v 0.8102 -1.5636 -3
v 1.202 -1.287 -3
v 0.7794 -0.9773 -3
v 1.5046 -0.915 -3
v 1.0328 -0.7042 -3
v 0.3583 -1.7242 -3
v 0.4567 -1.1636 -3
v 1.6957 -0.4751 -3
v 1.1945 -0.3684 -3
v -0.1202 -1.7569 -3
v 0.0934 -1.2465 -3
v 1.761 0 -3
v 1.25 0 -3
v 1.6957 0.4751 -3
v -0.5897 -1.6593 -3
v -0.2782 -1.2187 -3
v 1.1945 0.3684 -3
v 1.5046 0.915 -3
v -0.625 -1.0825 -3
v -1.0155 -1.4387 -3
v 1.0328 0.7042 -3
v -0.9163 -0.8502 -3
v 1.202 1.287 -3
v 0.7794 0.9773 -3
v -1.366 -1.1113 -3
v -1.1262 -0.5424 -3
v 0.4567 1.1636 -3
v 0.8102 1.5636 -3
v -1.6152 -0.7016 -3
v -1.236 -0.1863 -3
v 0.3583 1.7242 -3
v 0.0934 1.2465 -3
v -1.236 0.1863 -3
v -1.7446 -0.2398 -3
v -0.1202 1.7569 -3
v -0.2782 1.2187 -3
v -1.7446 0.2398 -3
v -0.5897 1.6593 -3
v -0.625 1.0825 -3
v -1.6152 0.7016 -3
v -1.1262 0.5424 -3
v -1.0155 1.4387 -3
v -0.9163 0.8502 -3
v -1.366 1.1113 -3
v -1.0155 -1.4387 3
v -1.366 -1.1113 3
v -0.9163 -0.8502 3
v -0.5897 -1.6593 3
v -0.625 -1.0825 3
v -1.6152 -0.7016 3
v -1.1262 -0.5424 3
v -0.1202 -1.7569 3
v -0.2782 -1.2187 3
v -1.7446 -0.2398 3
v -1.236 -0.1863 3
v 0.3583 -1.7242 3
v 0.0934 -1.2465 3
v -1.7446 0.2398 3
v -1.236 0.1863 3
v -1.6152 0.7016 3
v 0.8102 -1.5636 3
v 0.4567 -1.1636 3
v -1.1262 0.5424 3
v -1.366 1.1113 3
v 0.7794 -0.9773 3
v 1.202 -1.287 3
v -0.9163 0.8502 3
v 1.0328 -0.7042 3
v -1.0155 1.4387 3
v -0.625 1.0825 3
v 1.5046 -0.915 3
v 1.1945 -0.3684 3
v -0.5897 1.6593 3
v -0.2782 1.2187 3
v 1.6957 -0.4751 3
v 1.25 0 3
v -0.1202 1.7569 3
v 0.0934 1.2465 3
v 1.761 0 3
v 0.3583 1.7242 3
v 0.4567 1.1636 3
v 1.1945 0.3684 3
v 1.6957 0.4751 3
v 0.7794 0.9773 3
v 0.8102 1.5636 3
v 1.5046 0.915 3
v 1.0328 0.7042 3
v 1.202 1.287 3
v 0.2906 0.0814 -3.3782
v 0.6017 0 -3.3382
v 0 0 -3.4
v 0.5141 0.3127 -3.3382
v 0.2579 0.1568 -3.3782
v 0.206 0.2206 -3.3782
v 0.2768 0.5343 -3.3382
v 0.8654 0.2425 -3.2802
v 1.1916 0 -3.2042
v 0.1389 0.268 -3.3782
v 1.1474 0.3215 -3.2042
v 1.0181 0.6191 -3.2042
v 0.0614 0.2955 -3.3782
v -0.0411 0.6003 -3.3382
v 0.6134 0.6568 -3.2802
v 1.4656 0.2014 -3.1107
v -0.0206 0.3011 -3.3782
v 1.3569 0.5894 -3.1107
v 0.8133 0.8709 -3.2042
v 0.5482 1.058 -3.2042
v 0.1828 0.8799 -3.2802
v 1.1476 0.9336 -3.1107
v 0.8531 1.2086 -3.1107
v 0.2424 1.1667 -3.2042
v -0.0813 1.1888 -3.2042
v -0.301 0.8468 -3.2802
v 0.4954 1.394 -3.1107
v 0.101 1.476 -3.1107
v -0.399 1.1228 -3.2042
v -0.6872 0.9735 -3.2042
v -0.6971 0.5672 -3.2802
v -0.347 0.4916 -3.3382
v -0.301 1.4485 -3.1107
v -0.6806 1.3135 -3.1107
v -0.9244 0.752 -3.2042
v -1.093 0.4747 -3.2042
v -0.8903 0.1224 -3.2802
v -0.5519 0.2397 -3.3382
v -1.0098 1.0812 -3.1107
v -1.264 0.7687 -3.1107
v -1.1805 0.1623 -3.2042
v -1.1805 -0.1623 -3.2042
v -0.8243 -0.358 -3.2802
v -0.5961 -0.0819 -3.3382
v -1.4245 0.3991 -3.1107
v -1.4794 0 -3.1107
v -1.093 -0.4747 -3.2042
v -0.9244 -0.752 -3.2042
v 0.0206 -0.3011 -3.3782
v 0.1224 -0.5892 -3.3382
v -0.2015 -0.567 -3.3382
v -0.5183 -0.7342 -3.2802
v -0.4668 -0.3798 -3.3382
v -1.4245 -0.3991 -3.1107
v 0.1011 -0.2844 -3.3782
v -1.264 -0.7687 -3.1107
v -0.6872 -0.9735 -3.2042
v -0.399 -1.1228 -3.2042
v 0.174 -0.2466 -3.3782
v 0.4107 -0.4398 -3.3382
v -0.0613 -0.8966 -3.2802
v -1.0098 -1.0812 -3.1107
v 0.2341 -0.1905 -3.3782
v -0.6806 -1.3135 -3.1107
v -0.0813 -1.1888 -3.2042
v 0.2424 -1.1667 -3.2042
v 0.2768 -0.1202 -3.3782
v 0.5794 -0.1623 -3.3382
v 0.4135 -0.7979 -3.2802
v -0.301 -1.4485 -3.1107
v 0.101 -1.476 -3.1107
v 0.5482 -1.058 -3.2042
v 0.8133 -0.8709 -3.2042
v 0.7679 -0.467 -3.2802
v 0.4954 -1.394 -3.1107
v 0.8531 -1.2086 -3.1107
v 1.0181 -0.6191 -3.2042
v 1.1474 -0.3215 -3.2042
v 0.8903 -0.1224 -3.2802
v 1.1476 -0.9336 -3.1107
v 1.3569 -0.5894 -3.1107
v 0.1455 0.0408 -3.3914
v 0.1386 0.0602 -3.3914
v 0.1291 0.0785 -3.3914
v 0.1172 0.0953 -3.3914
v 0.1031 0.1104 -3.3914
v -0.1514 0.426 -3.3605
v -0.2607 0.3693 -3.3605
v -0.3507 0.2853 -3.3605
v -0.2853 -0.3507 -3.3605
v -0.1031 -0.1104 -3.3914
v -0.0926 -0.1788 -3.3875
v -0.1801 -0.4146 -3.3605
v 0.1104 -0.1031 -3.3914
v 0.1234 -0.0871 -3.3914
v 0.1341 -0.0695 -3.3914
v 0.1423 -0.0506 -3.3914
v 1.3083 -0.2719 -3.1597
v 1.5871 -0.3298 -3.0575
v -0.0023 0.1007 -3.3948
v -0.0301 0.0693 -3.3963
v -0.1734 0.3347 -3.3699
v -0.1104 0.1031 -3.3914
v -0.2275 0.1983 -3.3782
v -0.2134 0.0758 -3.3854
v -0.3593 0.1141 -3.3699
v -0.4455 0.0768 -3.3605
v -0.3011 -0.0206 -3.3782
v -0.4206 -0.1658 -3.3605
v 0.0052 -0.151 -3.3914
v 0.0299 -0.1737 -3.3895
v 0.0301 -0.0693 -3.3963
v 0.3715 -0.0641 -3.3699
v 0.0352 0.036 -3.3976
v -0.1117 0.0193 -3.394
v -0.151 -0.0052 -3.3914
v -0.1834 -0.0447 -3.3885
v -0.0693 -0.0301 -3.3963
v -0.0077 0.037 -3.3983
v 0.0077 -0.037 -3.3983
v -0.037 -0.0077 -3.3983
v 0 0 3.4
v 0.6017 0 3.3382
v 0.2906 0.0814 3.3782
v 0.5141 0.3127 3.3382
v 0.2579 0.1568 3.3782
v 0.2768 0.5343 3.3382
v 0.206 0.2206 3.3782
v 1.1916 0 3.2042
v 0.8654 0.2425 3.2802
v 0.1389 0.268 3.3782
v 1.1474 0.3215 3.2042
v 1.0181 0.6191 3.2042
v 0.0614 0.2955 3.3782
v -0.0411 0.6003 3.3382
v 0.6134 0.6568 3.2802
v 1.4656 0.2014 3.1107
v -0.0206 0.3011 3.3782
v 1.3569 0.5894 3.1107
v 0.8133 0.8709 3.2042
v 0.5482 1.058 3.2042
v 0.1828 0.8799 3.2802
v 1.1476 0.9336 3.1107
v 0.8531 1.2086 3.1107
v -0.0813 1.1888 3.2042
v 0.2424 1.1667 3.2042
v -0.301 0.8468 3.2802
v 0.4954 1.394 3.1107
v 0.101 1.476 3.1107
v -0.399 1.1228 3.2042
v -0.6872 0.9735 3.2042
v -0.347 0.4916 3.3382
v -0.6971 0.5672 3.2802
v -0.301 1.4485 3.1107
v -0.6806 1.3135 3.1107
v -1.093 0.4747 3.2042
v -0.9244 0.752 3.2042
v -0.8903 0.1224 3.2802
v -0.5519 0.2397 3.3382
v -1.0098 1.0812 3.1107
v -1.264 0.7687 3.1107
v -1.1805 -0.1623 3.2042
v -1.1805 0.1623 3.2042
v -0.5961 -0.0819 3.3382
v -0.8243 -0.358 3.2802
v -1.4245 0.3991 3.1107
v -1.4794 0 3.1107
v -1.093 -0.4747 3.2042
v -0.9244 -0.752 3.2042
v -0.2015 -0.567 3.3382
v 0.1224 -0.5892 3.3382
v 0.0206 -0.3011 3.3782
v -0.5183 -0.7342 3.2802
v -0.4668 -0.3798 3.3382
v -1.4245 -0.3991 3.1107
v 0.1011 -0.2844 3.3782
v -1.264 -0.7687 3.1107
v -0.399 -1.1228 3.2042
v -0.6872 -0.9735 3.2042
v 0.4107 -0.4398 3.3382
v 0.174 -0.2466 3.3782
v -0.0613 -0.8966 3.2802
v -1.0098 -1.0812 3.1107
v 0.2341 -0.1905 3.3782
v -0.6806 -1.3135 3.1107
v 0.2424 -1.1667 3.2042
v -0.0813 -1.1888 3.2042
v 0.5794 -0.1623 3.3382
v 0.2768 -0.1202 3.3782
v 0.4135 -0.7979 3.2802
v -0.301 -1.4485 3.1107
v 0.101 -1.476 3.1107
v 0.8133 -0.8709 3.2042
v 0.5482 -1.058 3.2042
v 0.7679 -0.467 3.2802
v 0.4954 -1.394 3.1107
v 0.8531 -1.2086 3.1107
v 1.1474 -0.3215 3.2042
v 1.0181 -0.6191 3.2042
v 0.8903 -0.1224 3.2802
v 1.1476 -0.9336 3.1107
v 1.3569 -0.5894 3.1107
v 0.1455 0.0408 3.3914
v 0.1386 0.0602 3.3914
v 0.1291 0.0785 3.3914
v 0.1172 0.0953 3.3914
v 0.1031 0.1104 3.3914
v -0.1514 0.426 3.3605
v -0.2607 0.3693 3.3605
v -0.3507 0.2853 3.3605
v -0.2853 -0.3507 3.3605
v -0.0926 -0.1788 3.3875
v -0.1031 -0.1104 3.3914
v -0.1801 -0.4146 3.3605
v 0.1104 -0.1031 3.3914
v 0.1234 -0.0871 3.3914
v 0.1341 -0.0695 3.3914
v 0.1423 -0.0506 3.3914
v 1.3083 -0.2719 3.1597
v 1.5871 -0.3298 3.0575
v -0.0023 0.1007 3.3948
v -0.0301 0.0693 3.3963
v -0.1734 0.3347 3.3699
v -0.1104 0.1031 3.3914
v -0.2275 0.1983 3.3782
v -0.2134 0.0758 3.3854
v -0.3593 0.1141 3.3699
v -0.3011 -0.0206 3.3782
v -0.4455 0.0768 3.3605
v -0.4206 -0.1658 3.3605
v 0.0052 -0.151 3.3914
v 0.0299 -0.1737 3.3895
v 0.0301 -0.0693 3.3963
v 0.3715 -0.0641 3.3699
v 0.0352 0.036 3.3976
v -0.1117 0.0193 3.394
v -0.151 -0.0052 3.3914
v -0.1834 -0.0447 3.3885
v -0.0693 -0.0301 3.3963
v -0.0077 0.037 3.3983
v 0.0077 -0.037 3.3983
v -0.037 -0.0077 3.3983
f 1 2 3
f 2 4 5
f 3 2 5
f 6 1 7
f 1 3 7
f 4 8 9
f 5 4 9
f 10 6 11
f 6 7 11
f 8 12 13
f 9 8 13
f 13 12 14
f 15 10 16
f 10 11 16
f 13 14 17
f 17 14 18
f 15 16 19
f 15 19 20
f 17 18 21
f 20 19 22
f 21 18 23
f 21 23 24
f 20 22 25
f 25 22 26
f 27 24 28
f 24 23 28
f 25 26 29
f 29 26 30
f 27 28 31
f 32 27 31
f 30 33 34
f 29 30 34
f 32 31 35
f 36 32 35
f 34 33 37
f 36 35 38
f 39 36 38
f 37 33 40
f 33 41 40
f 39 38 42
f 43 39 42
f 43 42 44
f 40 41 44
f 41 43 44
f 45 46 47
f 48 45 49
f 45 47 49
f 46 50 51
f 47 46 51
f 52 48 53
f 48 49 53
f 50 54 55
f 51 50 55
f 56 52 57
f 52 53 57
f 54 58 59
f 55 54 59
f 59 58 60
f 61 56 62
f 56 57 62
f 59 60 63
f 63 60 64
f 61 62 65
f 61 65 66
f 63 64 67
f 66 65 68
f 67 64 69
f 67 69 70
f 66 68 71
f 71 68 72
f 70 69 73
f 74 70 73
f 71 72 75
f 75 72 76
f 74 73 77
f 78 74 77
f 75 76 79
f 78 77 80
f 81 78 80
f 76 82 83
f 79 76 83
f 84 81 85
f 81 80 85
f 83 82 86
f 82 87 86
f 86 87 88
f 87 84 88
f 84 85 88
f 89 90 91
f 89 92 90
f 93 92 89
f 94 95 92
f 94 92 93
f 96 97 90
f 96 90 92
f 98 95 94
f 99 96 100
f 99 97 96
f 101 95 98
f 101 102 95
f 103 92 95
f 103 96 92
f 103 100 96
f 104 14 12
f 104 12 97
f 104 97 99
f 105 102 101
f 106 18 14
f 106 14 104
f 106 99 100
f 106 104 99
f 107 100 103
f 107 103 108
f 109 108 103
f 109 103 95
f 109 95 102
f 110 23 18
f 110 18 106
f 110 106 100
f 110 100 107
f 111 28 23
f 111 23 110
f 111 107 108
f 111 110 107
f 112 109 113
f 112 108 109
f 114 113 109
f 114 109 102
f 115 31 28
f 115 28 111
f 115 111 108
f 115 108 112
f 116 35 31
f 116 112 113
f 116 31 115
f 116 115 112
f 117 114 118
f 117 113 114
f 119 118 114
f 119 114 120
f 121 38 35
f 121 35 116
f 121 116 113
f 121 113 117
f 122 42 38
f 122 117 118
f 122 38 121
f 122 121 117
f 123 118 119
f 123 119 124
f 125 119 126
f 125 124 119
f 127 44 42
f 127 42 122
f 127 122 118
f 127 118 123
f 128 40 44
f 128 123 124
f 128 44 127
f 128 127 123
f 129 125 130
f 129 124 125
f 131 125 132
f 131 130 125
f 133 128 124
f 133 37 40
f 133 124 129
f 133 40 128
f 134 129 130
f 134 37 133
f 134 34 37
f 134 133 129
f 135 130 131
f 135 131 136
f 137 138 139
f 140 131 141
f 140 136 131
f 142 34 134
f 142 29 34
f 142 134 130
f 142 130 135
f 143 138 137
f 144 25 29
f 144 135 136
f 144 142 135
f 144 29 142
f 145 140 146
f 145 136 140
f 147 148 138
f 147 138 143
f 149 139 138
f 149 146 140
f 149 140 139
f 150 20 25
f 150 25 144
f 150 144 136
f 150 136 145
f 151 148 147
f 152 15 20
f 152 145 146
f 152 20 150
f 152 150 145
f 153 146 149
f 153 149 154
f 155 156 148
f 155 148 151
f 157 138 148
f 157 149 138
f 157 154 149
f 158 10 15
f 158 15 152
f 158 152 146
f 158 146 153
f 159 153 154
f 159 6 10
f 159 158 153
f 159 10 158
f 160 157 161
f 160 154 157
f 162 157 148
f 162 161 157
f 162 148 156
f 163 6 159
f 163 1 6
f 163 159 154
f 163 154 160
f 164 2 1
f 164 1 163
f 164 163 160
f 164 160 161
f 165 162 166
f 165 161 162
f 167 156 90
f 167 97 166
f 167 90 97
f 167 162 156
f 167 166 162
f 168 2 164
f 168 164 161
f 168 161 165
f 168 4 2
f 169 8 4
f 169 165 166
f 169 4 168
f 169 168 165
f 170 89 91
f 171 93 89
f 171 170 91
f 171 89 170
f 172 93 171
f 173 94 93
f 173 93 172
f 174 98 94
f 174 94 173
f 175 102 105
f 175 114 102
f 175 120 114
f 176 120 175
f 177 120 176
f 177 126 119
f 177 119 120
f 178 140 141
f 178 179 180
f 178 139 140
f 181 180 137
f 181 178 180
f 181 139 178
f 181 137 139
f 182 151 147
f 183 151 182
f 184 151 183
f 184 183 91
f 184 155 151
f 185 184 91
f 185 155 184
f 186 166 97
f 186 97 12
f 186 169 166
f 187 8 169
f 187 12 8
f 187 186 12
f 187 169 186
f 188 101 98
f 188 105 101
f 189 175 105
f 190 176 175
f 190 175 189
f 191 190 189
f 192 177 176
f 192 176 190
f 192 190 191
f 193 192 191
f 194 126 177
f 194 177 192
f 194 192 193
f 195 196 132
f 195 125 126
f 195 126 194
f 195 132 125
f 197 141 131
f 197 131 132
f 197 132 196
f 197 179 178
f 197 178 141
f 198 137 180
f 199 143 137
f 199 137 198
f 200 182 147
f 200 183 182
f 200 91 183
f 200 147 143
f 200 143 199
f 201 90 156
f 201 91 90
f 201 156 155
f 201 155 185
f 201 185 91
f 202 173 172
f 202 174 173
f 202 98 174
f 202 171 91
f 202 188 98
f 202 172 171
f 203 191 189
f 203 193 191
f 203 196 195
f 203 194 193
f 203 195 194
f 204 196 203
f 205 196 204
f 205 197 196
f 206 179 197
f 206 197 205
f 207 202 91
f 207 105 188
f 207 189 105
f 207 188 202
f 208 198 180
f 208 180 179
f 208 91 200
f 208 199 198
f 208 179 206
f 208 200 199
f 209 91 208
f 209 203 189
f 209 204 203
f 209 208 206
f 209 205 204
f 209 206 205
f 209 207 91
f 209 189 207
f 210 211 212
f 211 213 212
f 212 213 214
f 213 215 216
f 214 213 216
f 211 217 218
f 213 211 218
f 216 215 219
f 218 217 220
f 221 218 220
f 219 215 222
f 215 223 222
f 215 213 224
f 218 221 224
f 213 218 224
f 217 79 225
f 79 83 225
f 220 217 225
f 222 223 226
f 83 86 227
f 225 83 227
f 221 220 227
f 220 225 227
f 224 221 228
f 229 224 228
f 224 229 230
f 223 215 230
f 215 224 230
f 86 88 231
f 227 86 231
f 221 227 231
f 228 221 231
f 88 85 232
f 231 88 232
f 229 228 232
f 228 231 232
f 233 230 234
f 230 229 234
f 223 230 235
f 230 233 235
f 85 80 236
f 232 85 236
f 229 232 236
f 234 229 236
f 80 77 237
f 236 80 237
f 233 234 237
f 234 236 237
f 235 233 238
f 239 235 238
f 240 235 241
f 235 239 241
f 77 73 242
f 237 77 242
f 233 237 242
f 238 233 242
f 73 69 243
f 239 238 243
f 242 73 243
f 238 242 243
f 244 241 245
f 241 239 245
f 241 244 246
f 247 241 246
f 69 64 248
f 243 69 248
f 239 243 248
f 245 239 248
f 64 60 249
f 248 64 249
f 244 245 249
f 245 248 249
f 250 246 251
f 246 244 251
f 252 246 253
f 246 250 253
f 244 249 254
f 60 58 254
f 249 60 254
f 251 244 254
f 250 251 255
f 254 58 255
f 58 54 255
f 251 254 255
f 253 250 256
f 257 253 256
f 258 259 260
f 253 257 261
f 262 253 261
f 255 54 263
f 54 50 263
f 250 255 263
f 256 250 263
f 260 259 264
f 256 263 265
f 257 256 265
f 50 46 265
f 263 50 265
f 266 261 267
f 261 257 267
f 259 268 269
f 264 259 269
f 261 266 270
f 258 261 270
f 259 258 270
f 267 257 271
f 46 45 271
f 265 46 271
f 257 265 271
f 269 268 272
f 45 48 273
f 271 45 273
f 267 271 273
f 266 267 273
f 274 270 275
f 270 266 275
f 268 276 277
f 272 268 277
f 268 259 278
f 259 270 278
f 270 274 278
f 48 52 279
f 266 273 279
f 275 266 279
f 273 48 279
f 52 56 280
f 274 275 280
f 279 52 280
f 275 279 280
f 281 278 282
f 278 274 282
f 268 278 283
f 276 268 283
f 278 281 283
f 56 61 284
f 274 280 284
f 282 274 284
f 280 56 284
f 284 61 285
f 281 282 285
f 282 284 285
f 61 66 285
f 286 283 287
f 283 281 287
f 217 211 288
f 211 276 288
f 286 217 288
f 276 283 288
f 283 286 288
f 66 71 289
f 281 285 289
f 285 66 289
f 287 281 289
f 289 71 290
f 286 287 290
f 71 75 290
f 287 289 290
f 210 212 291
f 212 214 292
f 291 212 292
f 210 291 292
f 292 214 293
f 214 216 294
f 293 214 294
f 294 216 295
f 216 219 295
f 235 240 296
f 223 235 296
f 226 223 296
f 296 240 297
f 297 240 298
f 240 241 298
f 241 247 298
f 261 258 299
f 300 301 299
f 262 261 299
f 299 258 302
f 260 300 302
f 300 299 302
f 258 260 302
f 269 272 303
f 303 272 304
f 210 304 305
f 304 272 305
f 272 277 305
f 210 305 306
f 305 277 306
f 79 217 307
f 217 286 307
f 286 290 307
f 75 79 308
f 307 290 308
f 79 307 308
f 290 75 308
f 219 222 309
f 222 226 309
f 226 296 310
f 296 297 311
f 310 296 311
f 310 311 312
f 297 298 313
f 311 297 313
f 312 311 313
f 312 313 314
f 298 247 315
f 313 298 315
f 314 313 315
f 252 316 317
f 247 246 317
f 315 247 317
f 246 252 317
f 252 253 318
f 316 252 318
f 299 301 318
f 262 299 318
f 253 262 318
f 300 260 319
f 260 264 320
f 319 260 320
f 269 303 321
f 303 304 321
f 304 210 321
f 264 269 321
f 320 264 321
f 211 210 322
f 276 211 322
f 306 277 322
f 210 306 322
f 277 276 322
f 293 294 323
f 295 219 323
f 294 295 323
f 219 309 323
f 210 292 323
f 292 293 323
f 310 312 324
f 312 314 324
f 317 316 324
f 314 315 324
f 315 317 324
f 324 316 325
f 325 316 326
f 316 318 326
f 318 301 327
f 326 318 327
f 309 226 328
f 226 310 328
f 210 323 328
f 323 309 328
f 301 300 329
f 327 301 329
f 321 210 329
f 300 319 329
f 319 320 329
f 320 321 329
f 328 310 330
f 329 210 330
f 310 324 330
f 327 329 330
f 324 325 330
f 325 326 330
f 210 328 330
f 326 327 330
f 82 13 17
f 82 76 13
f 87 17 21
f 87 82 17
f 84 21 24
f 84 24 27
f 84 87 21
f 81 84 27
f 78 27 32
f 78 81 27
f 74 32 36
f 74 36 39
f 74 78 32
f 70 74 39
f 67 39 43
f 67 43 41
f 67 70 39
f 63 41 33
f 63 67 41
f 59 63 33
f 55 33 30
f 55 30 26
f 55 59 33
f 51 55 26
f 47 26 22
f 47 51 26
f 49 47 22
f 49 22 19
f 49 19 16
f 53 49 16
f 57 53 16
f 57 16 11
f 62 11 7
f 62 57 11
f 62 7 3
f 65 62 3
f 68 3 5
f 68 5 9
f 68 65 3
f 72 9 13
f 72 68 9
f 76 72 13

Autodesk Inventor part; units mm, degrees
ref_plane "YZ Plane" through (0, 0, 0) normal (1, 0, 0) x (0, 1, 0)
ref_plane "XZ Plane" through (0, 0, 0) normal (0, 1, 0) x (-1, 0, 0)
ref_plane "XY Plane" through (0, 0, 0) normal (0, 0, 1) x (1, 0, 0)
sketch "Sketch2" plane through (0, 0, 0) normal (0, 0, 1) x (1, 0, 0)
  circle A0 centre (0, 0) radius 1.25
  dimension "d44" = 2.5
extrude "Extrusion8" add sketch "Sketch2" along normal mid plane 6
sketch "Sketch3" plane through (0, 0, 3) normal (0, 0, 1) x (1, 0, 0)
  circle A0 centre (0, 0) radius 1.75
  dimension "d47" = 3.5
sketch "Sketch4" plane through (0, 0, 0) normal (0, 1, 0) x (-1, 0, 0)
  line L0 (1.25, 3) -> (-1.25, 3) projected
  line L1 (0, 3) -> (0, 3.4)
  arc A0 (0, 3.4) -> (-1.761, 3) centre (0.2088, -1.5956) ccw
  line L2 (0, 3) -> (-1.761, 3)
  point P0 (0, 0)
  dimension "d48" = 0.4
  dimension "d49" = 5
revolve "Revolution1" add sketch "Sketch4" angle 360 about axis through (0, 0, 3) along (0, 0, 1)
mirror "Mirror1" about plane through (0, 0, 0) normal (0, 0, 1) of "Revolution1"
properties part number "link7" material "Aluminum 6061"
